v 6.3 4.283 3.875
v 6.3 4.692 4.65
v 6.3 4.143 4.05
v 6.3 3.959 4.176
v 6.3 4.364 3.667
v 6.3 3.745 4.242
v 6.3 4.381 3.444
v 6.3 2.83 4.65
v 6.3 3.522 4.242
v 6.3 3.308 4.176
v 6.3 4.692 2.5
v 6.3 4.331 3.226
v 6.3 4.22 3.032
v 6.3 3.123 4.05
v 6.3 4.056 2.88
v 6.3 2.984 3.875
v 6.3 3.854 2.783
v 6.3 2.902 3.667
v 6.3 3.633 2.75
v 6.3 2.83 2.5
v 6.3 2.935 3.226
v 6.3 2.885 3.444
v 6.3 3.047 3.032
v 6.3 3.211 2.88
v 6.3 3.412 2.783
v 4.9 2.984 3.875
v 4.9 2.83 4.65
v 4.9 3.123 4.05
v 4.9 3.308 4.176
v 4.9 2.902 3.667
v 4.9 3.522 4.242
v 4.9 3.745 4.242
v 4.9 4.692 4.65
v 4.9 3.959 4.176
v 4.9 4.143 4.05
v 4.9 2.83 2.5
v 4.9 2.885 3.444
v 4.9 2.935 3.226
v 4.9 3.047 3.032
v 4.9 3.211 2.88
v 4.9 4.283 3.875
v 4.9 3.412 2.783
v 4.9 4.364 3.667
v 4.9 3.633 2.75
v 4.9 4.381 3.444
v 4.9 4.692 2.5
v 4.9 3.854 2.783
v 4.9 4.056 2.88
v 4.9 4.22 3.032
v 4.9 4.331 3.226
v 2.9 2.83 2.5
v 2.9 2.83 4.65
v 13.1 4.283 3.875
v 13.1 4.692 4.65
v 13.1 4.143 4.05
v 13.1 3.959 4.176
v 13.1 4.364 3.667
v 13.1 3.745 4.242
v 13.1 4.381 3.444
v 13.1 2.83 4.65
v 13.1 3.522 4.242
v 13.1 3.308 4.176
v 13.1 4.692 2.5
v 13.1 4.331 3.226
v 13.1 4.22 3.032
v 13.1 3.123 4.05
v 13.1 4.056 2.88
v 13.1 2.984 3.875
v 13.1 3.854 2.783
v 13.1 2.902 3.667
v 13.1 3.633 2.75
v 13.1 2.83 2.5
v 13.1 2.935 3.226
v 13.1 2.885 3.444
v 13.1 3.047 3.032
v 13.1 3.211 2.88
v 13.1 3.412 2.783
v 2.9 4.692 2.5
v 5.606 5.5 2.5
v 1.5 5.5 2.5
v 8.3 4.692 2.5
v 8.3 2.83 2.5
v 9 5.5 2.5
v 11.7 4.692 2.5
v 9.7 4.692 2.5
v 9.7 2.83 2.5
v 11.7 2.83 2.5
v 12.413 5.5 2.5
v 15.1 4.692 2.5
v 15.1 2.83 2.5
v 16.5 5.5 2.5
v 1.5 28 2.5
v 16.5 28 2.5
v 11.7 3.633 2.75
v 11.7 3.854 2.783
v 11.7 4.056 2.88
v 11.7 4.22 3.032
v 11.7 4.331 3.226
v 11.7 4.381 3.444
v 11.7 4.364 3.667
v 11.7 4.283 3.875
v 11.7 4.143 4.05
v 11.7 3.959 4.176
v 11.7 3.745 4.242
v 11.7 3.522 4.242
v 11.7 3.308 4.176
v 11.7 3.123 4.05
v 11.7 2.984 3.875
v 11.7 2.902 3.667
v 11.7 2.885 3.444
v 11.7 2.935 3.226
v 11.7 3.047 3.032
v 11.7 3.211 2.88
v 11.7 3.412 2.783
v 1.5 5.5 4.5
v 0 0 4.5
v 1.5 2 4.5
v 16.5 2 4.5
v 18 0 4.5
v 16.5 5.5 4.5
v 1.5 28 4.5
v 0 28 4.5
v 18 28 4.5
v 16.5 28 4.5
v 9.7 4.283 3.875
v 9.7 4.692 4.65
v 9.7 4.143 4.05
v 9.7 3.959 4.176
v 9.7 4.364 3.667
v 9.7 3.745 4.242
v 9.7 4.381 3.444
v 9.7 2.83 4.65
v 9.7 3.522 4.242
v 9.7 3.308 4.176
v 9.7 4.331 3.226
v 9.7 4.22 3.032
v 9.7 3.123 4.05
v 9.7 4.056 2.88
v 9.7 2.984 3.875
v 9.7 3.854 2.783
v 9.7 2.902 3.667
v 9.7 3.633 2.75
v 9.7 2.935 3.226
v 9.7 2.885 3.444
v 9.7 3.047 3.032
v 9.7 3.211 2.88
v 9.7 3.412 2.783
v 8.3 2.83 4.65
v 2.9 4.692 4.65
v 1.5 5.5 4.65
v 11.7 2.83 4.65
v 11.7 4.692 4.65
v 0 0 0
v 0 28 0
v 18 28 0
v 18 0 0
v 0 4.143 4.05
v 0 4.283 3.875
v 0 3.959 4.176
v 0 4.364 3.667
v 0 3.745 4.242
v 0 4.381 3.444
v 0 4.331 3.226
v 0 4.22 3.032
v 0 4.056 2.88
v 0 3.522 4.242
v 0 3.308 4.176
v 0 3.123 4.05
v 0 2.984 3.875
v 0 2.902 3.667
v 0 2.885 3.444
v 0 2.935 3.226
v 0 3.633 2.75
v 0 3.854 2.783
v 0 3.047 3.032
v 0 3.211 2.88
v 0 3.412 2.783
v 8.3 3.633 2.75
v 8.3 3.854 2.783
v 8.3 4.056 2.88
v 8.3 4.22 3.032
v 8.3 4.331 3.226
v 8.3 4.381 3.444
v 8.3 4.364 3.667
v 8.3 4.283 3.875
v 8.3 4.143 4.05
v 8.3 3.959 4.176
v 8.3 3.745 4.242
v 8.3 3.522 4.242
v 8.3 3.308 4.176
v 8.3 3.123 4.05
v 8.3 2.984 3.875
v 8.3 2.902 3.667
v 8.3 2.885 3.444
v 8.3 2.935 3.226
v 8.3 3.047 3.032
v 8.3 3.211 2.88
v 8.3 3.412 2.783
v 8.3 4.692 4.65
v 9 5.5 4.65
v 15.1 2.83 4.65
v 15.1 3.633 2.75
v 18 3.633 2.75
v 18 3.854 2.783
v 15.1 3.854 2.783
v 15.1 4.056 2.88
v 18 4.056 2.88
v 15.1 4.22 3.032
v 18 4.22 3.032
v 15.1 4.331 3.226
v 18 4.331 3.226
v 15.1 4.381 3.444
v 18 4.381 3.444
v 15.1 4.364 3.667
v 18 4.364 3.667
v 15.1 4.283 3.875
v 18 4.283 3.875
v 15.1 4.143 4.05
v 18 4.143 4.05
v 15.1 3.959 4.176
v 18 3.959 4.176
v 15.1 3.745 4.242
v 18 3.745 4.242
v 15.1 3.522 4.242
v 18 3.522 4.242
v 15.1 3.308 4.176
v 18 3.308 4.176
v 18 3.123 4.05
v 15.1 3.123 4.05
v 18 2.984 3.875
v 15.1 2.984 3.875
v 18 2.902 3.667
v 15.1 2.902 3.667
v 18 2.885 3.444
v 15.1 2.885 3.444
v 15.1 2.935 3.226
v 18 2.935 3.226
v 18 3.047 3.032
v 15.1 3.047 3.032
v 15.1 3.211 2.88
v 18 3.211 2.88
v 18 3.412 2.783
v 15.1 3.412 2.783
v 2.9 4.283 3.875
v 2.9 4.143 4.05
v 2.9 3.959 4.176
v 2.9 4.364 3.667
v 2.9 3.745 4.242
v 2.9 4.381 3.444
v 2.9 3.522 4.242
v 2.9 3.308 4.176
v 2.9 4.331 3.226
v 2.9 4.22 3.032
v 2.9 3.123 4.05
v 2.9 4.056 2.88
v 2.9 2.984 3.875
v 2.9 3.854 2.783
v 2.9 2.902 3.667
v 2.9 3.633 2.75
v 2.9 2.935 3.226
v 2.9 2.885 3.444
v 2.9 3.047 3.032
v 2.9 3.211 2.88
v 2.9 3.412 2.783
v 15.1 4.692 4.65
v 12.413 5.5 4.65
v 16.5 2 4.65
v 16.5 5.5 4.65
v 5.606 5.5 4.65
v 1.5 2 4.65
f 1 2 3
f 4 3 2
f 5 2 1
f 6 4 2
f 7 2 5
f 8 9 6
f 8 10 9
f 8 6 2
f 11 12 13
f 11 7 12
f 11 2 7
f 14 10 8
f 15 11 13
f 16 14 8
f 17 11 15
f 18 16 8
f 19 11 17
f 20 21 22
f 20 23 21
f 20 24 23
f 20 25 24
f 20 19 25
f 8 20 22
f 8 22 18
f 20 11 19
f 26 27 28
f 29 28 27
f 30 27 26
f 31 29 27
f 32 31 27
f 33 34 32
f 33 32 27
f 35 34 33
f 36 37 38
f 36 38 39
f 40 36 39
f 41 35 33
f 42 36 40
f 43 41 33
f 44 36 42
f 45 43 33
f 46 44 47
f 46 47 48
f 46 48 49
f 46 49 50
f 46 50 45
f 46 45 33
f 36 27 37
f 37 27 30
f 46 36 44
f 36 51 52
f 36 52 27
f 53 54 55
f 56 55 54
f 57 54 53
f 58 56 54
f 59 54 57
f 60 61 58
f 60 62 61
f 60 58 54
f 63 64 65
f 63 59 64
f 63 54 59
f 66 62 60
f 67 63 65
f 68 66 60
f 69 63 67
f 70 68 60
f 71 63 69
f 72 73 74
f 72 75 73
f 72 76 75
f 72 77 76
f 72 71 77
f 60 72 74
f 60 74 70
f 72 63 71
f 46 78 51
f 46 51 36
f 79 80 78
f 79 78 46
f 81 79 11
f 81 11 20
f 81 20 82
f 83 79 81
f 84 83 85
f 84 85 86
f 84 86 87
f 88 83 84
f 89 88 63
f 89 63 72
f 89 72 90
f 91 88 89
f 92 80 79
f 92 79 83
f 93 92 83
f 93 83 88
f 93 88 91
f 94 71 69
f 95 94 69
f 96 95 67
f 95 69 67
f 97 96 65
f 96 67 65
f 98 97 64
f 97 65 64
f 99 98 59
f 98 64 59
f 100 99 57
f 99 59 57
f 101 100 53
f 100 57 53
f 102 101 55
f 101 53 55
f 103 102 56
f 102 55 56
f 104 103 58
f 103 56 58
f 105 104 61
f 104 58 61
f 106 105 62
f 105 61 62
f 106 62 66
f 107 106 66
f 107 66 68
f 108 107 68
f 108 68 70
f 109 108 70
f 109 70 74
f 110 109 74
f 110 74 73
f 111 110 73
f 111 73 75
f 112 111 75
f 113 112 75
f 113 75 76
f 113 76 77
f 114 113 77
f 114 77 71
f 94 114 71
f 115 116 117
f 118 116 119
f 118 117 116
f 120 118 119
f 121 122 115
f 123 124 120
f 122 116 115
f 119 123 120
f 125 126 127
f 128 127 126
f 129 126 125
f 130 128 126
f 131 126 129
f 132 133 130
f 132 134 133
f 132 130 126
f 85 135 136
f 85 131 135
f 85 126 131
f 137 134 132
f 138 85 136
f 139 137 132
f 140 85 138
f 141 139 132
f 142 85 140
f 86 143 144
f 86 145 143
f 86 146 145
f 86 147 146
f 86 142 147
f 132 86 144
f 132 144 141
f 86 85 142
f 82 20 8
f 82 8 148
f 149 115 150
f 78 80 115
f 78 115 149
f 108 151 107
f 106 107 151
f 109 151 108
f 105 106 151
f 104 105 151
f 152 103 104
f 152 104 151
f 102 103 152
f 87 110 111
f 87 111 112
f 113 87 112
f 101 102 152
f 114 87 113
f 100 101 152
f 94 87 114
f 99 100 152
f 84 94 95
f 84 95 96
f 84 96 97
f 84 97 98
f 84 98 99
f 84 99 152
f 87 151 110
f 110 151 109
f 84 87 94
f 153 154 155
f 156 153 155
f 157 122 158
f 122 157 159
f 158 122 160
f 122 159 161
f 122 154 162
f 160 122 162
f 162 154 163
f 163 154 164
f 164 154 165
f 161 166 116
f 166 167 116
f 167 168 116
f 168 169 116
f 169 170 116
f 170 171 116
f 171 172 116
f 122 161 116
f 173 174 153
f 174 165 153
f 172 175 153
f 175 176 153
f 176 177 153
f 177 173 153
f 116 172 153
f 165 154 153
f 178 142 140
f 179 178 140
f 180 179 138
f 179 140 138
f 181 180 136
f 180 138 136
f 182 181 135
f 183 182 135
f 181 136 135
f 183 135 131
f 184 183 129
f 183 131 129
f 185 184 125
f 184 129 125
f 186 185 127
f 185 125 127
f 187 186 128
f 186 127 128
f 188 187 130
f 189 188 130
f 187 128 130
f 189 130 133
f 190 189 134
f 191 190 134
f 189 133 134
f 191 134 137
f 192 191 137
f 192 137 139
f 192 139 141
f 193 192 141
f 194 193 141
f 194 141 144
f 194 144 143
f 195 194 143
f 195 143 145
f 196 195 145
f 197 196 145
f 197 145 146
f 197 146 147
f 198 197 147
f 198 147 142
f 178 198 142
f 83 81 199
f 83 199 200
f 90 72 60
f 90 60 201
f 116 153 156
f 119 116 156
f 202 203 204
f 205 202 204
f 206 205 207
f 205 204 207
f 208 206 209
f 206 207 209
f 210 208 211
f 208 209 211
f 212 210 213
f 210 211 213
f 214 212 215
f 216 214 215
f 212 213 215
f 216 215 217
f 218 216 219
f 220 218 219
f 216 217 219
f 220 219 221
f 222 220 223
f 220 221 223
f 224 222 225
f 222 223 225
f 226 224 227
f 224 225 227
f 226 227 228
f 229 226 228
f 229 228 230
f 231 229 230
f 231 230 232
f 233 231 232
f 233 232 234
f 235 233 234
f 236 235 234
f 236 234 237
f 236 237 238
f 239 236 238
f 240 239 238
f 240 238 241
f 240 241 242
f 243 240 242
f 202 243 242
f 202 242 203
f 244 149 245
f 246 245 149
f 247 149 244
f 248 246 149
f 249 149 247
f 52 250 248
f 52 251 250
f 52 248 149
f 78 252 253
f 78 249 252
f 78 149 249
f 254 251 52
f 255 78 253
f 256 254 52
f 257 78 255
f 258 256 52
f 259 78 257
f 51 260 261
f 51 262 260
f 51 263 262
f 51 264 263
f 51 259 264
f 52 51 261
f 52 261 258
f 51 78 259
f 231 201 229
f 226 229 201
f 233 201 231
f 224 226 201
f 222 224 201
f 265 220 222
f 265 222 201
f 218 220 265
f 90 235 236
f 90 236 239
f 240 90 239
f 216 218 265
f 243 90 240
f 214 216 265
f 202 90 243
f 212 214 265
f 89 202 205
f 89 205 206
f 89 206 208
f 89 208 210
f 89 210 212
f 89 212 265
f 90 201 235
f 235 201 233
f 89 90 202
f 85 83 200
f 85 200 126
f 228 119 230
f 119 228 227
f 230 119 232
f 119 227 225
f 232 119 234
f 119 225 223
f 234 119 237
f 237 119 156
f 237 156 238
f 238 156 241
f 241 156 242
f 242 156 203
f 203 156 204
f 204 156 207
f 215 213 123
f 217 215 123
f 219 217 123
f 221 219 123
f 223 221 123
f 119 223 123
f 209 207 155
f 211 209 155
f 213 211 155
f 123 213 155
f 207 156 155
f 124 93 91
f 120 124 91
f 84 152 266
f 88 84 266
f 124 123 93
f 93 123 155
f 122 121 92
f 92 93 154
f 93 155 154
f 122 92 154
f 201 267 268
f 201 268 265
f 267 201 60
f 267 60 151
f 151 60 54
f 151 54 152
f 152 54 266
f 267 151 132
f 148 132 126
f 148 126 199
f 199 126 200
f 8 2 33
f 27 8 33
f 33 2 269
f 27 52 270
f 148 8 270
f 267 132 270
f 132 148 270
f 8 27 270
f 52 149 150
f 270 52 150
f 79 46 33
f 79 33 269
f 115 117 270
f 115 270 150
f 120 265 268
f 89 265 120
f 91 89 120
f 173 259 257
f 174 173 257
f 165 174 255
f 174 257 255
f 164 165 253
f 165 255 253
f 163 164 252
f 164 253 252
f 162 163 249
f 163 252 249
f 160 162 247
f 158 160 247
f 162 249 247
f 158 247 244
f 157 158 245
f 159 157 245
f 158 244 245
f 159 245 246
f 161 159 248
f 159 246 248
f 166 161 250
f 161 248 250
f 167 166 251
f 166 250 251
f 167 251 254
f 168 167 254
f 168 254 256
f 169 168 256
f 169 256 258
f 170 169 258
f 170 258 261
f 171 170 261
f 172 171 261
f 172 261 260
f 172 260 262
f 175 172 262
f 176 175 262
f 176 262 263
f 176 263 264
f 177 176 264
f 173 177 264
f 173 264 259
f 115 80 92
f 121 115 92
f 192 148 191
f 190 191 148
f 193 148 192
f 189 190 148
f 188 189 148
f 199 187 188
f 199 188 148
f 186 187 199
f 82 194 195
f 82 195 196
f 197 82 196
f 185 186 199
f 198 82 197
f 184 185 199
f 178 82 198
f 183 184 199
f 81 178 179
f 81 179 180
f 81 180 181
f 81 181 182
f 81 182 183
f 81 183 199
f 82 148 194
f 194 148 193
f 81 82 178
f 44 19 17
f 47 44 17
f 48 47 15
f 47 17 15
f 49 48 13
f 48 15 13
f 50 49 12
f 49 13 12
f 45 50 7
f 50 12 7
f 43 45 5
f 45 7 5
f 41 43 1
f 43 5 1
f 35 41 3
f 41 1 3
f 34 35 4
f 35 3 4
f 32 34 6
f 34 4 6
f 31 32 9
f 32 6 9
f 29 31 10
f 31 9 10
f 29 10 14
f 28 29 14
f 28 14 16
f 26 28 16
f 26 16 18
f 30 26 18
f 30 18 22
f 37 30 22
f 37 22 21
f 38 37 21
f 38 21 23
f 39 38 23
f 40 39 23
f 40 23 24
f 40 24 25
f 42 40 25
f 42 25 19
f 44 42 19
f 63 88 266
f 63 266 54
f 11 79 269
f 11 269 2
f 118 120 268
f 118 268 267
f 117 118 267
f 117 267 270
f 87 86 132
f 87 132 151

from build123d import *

# Parameters (mm, degrees)
ESBO_O1_W                = 15
ESBO_O1_H                = 26
RESSALTO_EXTRUS_O1_DEPTH = 2.5
RESSALTO_EXTRUS_O2_DEPTH = 4.5
RESSALTO_EXTRUS_O3_DEPTH = 2.15
ESBO_O3_R                = 0.75
CORTE_EXTRUS_O1_DEPTH    = 34.609857185


with BuildPart() as part:
    # Esboço1 → Ressalto-extrusão1 (new body)
    with BuildSketch(Plane.XY):
        with Locations((9, 15)):
            Rectangle(ESBO_O1_W, ESBO_O1_H)
    extrude(amount=RESSALTO_EXTRUS_O1_DEPTH)

    # Esboço1<3> → Ressalto-extrusão2 (add)
    with BuildSketch(Plane.XY):
        Polygon((1.5, 2), (1.5, 28), (0, 28), (0, 0), (18, 0), (18, 28), (16.5, 28), (16.5, 2), align=None)
    extrude(amount=RESSALTO_EXTRUS_O2_DEPTH)

    # Esboço2 → Ressalto-extrusão3 (add)
    with BuildSketch(Plane.XY.offset(2.5)):
        Polygon((1.5, 2), (1.5, 5.5), (2.9, 4.691709623), (2.9, 2.829578102), (4.9, 2.829578102), (4.9, 4.691709623), (5.605720556, 5.5), (6.3, 4.691709623), (6.3, 2.829578102), (8.3, 2.829578102), (8.3, 4.691709623), (9, 5.5), (9.7, 4.691709623), (9.7, 2.829578102), (11.7, 2.829578102), (11.7, 4.691709623), (12.412546272, 5.5), (13.1, 4.691709623), (13.1, 2.829578102), (15.1, 2.829578102), (15.1, 4.691709623), (16.5, 5.5), (16.5, 2), align=None)
    extrude(amount=RESSALTO_EXTRUS_O3_DEPTH)

    # Esboço3 → Corte-extrusão1 (cut, through all)
    with BuildSketch(Plane(origin=(18, 0, 0), x_dir=(0, 0, -1), z_dir=(1, 0, 0))):
        with Locations((-3.5, 3.633303465)):
            Circle(ESBO_O3_R)
    extrude(amount=-CORTE_EXTRUS_O1_DEPTH, mode=Mode.SUBTRACT)


solid = part.part
